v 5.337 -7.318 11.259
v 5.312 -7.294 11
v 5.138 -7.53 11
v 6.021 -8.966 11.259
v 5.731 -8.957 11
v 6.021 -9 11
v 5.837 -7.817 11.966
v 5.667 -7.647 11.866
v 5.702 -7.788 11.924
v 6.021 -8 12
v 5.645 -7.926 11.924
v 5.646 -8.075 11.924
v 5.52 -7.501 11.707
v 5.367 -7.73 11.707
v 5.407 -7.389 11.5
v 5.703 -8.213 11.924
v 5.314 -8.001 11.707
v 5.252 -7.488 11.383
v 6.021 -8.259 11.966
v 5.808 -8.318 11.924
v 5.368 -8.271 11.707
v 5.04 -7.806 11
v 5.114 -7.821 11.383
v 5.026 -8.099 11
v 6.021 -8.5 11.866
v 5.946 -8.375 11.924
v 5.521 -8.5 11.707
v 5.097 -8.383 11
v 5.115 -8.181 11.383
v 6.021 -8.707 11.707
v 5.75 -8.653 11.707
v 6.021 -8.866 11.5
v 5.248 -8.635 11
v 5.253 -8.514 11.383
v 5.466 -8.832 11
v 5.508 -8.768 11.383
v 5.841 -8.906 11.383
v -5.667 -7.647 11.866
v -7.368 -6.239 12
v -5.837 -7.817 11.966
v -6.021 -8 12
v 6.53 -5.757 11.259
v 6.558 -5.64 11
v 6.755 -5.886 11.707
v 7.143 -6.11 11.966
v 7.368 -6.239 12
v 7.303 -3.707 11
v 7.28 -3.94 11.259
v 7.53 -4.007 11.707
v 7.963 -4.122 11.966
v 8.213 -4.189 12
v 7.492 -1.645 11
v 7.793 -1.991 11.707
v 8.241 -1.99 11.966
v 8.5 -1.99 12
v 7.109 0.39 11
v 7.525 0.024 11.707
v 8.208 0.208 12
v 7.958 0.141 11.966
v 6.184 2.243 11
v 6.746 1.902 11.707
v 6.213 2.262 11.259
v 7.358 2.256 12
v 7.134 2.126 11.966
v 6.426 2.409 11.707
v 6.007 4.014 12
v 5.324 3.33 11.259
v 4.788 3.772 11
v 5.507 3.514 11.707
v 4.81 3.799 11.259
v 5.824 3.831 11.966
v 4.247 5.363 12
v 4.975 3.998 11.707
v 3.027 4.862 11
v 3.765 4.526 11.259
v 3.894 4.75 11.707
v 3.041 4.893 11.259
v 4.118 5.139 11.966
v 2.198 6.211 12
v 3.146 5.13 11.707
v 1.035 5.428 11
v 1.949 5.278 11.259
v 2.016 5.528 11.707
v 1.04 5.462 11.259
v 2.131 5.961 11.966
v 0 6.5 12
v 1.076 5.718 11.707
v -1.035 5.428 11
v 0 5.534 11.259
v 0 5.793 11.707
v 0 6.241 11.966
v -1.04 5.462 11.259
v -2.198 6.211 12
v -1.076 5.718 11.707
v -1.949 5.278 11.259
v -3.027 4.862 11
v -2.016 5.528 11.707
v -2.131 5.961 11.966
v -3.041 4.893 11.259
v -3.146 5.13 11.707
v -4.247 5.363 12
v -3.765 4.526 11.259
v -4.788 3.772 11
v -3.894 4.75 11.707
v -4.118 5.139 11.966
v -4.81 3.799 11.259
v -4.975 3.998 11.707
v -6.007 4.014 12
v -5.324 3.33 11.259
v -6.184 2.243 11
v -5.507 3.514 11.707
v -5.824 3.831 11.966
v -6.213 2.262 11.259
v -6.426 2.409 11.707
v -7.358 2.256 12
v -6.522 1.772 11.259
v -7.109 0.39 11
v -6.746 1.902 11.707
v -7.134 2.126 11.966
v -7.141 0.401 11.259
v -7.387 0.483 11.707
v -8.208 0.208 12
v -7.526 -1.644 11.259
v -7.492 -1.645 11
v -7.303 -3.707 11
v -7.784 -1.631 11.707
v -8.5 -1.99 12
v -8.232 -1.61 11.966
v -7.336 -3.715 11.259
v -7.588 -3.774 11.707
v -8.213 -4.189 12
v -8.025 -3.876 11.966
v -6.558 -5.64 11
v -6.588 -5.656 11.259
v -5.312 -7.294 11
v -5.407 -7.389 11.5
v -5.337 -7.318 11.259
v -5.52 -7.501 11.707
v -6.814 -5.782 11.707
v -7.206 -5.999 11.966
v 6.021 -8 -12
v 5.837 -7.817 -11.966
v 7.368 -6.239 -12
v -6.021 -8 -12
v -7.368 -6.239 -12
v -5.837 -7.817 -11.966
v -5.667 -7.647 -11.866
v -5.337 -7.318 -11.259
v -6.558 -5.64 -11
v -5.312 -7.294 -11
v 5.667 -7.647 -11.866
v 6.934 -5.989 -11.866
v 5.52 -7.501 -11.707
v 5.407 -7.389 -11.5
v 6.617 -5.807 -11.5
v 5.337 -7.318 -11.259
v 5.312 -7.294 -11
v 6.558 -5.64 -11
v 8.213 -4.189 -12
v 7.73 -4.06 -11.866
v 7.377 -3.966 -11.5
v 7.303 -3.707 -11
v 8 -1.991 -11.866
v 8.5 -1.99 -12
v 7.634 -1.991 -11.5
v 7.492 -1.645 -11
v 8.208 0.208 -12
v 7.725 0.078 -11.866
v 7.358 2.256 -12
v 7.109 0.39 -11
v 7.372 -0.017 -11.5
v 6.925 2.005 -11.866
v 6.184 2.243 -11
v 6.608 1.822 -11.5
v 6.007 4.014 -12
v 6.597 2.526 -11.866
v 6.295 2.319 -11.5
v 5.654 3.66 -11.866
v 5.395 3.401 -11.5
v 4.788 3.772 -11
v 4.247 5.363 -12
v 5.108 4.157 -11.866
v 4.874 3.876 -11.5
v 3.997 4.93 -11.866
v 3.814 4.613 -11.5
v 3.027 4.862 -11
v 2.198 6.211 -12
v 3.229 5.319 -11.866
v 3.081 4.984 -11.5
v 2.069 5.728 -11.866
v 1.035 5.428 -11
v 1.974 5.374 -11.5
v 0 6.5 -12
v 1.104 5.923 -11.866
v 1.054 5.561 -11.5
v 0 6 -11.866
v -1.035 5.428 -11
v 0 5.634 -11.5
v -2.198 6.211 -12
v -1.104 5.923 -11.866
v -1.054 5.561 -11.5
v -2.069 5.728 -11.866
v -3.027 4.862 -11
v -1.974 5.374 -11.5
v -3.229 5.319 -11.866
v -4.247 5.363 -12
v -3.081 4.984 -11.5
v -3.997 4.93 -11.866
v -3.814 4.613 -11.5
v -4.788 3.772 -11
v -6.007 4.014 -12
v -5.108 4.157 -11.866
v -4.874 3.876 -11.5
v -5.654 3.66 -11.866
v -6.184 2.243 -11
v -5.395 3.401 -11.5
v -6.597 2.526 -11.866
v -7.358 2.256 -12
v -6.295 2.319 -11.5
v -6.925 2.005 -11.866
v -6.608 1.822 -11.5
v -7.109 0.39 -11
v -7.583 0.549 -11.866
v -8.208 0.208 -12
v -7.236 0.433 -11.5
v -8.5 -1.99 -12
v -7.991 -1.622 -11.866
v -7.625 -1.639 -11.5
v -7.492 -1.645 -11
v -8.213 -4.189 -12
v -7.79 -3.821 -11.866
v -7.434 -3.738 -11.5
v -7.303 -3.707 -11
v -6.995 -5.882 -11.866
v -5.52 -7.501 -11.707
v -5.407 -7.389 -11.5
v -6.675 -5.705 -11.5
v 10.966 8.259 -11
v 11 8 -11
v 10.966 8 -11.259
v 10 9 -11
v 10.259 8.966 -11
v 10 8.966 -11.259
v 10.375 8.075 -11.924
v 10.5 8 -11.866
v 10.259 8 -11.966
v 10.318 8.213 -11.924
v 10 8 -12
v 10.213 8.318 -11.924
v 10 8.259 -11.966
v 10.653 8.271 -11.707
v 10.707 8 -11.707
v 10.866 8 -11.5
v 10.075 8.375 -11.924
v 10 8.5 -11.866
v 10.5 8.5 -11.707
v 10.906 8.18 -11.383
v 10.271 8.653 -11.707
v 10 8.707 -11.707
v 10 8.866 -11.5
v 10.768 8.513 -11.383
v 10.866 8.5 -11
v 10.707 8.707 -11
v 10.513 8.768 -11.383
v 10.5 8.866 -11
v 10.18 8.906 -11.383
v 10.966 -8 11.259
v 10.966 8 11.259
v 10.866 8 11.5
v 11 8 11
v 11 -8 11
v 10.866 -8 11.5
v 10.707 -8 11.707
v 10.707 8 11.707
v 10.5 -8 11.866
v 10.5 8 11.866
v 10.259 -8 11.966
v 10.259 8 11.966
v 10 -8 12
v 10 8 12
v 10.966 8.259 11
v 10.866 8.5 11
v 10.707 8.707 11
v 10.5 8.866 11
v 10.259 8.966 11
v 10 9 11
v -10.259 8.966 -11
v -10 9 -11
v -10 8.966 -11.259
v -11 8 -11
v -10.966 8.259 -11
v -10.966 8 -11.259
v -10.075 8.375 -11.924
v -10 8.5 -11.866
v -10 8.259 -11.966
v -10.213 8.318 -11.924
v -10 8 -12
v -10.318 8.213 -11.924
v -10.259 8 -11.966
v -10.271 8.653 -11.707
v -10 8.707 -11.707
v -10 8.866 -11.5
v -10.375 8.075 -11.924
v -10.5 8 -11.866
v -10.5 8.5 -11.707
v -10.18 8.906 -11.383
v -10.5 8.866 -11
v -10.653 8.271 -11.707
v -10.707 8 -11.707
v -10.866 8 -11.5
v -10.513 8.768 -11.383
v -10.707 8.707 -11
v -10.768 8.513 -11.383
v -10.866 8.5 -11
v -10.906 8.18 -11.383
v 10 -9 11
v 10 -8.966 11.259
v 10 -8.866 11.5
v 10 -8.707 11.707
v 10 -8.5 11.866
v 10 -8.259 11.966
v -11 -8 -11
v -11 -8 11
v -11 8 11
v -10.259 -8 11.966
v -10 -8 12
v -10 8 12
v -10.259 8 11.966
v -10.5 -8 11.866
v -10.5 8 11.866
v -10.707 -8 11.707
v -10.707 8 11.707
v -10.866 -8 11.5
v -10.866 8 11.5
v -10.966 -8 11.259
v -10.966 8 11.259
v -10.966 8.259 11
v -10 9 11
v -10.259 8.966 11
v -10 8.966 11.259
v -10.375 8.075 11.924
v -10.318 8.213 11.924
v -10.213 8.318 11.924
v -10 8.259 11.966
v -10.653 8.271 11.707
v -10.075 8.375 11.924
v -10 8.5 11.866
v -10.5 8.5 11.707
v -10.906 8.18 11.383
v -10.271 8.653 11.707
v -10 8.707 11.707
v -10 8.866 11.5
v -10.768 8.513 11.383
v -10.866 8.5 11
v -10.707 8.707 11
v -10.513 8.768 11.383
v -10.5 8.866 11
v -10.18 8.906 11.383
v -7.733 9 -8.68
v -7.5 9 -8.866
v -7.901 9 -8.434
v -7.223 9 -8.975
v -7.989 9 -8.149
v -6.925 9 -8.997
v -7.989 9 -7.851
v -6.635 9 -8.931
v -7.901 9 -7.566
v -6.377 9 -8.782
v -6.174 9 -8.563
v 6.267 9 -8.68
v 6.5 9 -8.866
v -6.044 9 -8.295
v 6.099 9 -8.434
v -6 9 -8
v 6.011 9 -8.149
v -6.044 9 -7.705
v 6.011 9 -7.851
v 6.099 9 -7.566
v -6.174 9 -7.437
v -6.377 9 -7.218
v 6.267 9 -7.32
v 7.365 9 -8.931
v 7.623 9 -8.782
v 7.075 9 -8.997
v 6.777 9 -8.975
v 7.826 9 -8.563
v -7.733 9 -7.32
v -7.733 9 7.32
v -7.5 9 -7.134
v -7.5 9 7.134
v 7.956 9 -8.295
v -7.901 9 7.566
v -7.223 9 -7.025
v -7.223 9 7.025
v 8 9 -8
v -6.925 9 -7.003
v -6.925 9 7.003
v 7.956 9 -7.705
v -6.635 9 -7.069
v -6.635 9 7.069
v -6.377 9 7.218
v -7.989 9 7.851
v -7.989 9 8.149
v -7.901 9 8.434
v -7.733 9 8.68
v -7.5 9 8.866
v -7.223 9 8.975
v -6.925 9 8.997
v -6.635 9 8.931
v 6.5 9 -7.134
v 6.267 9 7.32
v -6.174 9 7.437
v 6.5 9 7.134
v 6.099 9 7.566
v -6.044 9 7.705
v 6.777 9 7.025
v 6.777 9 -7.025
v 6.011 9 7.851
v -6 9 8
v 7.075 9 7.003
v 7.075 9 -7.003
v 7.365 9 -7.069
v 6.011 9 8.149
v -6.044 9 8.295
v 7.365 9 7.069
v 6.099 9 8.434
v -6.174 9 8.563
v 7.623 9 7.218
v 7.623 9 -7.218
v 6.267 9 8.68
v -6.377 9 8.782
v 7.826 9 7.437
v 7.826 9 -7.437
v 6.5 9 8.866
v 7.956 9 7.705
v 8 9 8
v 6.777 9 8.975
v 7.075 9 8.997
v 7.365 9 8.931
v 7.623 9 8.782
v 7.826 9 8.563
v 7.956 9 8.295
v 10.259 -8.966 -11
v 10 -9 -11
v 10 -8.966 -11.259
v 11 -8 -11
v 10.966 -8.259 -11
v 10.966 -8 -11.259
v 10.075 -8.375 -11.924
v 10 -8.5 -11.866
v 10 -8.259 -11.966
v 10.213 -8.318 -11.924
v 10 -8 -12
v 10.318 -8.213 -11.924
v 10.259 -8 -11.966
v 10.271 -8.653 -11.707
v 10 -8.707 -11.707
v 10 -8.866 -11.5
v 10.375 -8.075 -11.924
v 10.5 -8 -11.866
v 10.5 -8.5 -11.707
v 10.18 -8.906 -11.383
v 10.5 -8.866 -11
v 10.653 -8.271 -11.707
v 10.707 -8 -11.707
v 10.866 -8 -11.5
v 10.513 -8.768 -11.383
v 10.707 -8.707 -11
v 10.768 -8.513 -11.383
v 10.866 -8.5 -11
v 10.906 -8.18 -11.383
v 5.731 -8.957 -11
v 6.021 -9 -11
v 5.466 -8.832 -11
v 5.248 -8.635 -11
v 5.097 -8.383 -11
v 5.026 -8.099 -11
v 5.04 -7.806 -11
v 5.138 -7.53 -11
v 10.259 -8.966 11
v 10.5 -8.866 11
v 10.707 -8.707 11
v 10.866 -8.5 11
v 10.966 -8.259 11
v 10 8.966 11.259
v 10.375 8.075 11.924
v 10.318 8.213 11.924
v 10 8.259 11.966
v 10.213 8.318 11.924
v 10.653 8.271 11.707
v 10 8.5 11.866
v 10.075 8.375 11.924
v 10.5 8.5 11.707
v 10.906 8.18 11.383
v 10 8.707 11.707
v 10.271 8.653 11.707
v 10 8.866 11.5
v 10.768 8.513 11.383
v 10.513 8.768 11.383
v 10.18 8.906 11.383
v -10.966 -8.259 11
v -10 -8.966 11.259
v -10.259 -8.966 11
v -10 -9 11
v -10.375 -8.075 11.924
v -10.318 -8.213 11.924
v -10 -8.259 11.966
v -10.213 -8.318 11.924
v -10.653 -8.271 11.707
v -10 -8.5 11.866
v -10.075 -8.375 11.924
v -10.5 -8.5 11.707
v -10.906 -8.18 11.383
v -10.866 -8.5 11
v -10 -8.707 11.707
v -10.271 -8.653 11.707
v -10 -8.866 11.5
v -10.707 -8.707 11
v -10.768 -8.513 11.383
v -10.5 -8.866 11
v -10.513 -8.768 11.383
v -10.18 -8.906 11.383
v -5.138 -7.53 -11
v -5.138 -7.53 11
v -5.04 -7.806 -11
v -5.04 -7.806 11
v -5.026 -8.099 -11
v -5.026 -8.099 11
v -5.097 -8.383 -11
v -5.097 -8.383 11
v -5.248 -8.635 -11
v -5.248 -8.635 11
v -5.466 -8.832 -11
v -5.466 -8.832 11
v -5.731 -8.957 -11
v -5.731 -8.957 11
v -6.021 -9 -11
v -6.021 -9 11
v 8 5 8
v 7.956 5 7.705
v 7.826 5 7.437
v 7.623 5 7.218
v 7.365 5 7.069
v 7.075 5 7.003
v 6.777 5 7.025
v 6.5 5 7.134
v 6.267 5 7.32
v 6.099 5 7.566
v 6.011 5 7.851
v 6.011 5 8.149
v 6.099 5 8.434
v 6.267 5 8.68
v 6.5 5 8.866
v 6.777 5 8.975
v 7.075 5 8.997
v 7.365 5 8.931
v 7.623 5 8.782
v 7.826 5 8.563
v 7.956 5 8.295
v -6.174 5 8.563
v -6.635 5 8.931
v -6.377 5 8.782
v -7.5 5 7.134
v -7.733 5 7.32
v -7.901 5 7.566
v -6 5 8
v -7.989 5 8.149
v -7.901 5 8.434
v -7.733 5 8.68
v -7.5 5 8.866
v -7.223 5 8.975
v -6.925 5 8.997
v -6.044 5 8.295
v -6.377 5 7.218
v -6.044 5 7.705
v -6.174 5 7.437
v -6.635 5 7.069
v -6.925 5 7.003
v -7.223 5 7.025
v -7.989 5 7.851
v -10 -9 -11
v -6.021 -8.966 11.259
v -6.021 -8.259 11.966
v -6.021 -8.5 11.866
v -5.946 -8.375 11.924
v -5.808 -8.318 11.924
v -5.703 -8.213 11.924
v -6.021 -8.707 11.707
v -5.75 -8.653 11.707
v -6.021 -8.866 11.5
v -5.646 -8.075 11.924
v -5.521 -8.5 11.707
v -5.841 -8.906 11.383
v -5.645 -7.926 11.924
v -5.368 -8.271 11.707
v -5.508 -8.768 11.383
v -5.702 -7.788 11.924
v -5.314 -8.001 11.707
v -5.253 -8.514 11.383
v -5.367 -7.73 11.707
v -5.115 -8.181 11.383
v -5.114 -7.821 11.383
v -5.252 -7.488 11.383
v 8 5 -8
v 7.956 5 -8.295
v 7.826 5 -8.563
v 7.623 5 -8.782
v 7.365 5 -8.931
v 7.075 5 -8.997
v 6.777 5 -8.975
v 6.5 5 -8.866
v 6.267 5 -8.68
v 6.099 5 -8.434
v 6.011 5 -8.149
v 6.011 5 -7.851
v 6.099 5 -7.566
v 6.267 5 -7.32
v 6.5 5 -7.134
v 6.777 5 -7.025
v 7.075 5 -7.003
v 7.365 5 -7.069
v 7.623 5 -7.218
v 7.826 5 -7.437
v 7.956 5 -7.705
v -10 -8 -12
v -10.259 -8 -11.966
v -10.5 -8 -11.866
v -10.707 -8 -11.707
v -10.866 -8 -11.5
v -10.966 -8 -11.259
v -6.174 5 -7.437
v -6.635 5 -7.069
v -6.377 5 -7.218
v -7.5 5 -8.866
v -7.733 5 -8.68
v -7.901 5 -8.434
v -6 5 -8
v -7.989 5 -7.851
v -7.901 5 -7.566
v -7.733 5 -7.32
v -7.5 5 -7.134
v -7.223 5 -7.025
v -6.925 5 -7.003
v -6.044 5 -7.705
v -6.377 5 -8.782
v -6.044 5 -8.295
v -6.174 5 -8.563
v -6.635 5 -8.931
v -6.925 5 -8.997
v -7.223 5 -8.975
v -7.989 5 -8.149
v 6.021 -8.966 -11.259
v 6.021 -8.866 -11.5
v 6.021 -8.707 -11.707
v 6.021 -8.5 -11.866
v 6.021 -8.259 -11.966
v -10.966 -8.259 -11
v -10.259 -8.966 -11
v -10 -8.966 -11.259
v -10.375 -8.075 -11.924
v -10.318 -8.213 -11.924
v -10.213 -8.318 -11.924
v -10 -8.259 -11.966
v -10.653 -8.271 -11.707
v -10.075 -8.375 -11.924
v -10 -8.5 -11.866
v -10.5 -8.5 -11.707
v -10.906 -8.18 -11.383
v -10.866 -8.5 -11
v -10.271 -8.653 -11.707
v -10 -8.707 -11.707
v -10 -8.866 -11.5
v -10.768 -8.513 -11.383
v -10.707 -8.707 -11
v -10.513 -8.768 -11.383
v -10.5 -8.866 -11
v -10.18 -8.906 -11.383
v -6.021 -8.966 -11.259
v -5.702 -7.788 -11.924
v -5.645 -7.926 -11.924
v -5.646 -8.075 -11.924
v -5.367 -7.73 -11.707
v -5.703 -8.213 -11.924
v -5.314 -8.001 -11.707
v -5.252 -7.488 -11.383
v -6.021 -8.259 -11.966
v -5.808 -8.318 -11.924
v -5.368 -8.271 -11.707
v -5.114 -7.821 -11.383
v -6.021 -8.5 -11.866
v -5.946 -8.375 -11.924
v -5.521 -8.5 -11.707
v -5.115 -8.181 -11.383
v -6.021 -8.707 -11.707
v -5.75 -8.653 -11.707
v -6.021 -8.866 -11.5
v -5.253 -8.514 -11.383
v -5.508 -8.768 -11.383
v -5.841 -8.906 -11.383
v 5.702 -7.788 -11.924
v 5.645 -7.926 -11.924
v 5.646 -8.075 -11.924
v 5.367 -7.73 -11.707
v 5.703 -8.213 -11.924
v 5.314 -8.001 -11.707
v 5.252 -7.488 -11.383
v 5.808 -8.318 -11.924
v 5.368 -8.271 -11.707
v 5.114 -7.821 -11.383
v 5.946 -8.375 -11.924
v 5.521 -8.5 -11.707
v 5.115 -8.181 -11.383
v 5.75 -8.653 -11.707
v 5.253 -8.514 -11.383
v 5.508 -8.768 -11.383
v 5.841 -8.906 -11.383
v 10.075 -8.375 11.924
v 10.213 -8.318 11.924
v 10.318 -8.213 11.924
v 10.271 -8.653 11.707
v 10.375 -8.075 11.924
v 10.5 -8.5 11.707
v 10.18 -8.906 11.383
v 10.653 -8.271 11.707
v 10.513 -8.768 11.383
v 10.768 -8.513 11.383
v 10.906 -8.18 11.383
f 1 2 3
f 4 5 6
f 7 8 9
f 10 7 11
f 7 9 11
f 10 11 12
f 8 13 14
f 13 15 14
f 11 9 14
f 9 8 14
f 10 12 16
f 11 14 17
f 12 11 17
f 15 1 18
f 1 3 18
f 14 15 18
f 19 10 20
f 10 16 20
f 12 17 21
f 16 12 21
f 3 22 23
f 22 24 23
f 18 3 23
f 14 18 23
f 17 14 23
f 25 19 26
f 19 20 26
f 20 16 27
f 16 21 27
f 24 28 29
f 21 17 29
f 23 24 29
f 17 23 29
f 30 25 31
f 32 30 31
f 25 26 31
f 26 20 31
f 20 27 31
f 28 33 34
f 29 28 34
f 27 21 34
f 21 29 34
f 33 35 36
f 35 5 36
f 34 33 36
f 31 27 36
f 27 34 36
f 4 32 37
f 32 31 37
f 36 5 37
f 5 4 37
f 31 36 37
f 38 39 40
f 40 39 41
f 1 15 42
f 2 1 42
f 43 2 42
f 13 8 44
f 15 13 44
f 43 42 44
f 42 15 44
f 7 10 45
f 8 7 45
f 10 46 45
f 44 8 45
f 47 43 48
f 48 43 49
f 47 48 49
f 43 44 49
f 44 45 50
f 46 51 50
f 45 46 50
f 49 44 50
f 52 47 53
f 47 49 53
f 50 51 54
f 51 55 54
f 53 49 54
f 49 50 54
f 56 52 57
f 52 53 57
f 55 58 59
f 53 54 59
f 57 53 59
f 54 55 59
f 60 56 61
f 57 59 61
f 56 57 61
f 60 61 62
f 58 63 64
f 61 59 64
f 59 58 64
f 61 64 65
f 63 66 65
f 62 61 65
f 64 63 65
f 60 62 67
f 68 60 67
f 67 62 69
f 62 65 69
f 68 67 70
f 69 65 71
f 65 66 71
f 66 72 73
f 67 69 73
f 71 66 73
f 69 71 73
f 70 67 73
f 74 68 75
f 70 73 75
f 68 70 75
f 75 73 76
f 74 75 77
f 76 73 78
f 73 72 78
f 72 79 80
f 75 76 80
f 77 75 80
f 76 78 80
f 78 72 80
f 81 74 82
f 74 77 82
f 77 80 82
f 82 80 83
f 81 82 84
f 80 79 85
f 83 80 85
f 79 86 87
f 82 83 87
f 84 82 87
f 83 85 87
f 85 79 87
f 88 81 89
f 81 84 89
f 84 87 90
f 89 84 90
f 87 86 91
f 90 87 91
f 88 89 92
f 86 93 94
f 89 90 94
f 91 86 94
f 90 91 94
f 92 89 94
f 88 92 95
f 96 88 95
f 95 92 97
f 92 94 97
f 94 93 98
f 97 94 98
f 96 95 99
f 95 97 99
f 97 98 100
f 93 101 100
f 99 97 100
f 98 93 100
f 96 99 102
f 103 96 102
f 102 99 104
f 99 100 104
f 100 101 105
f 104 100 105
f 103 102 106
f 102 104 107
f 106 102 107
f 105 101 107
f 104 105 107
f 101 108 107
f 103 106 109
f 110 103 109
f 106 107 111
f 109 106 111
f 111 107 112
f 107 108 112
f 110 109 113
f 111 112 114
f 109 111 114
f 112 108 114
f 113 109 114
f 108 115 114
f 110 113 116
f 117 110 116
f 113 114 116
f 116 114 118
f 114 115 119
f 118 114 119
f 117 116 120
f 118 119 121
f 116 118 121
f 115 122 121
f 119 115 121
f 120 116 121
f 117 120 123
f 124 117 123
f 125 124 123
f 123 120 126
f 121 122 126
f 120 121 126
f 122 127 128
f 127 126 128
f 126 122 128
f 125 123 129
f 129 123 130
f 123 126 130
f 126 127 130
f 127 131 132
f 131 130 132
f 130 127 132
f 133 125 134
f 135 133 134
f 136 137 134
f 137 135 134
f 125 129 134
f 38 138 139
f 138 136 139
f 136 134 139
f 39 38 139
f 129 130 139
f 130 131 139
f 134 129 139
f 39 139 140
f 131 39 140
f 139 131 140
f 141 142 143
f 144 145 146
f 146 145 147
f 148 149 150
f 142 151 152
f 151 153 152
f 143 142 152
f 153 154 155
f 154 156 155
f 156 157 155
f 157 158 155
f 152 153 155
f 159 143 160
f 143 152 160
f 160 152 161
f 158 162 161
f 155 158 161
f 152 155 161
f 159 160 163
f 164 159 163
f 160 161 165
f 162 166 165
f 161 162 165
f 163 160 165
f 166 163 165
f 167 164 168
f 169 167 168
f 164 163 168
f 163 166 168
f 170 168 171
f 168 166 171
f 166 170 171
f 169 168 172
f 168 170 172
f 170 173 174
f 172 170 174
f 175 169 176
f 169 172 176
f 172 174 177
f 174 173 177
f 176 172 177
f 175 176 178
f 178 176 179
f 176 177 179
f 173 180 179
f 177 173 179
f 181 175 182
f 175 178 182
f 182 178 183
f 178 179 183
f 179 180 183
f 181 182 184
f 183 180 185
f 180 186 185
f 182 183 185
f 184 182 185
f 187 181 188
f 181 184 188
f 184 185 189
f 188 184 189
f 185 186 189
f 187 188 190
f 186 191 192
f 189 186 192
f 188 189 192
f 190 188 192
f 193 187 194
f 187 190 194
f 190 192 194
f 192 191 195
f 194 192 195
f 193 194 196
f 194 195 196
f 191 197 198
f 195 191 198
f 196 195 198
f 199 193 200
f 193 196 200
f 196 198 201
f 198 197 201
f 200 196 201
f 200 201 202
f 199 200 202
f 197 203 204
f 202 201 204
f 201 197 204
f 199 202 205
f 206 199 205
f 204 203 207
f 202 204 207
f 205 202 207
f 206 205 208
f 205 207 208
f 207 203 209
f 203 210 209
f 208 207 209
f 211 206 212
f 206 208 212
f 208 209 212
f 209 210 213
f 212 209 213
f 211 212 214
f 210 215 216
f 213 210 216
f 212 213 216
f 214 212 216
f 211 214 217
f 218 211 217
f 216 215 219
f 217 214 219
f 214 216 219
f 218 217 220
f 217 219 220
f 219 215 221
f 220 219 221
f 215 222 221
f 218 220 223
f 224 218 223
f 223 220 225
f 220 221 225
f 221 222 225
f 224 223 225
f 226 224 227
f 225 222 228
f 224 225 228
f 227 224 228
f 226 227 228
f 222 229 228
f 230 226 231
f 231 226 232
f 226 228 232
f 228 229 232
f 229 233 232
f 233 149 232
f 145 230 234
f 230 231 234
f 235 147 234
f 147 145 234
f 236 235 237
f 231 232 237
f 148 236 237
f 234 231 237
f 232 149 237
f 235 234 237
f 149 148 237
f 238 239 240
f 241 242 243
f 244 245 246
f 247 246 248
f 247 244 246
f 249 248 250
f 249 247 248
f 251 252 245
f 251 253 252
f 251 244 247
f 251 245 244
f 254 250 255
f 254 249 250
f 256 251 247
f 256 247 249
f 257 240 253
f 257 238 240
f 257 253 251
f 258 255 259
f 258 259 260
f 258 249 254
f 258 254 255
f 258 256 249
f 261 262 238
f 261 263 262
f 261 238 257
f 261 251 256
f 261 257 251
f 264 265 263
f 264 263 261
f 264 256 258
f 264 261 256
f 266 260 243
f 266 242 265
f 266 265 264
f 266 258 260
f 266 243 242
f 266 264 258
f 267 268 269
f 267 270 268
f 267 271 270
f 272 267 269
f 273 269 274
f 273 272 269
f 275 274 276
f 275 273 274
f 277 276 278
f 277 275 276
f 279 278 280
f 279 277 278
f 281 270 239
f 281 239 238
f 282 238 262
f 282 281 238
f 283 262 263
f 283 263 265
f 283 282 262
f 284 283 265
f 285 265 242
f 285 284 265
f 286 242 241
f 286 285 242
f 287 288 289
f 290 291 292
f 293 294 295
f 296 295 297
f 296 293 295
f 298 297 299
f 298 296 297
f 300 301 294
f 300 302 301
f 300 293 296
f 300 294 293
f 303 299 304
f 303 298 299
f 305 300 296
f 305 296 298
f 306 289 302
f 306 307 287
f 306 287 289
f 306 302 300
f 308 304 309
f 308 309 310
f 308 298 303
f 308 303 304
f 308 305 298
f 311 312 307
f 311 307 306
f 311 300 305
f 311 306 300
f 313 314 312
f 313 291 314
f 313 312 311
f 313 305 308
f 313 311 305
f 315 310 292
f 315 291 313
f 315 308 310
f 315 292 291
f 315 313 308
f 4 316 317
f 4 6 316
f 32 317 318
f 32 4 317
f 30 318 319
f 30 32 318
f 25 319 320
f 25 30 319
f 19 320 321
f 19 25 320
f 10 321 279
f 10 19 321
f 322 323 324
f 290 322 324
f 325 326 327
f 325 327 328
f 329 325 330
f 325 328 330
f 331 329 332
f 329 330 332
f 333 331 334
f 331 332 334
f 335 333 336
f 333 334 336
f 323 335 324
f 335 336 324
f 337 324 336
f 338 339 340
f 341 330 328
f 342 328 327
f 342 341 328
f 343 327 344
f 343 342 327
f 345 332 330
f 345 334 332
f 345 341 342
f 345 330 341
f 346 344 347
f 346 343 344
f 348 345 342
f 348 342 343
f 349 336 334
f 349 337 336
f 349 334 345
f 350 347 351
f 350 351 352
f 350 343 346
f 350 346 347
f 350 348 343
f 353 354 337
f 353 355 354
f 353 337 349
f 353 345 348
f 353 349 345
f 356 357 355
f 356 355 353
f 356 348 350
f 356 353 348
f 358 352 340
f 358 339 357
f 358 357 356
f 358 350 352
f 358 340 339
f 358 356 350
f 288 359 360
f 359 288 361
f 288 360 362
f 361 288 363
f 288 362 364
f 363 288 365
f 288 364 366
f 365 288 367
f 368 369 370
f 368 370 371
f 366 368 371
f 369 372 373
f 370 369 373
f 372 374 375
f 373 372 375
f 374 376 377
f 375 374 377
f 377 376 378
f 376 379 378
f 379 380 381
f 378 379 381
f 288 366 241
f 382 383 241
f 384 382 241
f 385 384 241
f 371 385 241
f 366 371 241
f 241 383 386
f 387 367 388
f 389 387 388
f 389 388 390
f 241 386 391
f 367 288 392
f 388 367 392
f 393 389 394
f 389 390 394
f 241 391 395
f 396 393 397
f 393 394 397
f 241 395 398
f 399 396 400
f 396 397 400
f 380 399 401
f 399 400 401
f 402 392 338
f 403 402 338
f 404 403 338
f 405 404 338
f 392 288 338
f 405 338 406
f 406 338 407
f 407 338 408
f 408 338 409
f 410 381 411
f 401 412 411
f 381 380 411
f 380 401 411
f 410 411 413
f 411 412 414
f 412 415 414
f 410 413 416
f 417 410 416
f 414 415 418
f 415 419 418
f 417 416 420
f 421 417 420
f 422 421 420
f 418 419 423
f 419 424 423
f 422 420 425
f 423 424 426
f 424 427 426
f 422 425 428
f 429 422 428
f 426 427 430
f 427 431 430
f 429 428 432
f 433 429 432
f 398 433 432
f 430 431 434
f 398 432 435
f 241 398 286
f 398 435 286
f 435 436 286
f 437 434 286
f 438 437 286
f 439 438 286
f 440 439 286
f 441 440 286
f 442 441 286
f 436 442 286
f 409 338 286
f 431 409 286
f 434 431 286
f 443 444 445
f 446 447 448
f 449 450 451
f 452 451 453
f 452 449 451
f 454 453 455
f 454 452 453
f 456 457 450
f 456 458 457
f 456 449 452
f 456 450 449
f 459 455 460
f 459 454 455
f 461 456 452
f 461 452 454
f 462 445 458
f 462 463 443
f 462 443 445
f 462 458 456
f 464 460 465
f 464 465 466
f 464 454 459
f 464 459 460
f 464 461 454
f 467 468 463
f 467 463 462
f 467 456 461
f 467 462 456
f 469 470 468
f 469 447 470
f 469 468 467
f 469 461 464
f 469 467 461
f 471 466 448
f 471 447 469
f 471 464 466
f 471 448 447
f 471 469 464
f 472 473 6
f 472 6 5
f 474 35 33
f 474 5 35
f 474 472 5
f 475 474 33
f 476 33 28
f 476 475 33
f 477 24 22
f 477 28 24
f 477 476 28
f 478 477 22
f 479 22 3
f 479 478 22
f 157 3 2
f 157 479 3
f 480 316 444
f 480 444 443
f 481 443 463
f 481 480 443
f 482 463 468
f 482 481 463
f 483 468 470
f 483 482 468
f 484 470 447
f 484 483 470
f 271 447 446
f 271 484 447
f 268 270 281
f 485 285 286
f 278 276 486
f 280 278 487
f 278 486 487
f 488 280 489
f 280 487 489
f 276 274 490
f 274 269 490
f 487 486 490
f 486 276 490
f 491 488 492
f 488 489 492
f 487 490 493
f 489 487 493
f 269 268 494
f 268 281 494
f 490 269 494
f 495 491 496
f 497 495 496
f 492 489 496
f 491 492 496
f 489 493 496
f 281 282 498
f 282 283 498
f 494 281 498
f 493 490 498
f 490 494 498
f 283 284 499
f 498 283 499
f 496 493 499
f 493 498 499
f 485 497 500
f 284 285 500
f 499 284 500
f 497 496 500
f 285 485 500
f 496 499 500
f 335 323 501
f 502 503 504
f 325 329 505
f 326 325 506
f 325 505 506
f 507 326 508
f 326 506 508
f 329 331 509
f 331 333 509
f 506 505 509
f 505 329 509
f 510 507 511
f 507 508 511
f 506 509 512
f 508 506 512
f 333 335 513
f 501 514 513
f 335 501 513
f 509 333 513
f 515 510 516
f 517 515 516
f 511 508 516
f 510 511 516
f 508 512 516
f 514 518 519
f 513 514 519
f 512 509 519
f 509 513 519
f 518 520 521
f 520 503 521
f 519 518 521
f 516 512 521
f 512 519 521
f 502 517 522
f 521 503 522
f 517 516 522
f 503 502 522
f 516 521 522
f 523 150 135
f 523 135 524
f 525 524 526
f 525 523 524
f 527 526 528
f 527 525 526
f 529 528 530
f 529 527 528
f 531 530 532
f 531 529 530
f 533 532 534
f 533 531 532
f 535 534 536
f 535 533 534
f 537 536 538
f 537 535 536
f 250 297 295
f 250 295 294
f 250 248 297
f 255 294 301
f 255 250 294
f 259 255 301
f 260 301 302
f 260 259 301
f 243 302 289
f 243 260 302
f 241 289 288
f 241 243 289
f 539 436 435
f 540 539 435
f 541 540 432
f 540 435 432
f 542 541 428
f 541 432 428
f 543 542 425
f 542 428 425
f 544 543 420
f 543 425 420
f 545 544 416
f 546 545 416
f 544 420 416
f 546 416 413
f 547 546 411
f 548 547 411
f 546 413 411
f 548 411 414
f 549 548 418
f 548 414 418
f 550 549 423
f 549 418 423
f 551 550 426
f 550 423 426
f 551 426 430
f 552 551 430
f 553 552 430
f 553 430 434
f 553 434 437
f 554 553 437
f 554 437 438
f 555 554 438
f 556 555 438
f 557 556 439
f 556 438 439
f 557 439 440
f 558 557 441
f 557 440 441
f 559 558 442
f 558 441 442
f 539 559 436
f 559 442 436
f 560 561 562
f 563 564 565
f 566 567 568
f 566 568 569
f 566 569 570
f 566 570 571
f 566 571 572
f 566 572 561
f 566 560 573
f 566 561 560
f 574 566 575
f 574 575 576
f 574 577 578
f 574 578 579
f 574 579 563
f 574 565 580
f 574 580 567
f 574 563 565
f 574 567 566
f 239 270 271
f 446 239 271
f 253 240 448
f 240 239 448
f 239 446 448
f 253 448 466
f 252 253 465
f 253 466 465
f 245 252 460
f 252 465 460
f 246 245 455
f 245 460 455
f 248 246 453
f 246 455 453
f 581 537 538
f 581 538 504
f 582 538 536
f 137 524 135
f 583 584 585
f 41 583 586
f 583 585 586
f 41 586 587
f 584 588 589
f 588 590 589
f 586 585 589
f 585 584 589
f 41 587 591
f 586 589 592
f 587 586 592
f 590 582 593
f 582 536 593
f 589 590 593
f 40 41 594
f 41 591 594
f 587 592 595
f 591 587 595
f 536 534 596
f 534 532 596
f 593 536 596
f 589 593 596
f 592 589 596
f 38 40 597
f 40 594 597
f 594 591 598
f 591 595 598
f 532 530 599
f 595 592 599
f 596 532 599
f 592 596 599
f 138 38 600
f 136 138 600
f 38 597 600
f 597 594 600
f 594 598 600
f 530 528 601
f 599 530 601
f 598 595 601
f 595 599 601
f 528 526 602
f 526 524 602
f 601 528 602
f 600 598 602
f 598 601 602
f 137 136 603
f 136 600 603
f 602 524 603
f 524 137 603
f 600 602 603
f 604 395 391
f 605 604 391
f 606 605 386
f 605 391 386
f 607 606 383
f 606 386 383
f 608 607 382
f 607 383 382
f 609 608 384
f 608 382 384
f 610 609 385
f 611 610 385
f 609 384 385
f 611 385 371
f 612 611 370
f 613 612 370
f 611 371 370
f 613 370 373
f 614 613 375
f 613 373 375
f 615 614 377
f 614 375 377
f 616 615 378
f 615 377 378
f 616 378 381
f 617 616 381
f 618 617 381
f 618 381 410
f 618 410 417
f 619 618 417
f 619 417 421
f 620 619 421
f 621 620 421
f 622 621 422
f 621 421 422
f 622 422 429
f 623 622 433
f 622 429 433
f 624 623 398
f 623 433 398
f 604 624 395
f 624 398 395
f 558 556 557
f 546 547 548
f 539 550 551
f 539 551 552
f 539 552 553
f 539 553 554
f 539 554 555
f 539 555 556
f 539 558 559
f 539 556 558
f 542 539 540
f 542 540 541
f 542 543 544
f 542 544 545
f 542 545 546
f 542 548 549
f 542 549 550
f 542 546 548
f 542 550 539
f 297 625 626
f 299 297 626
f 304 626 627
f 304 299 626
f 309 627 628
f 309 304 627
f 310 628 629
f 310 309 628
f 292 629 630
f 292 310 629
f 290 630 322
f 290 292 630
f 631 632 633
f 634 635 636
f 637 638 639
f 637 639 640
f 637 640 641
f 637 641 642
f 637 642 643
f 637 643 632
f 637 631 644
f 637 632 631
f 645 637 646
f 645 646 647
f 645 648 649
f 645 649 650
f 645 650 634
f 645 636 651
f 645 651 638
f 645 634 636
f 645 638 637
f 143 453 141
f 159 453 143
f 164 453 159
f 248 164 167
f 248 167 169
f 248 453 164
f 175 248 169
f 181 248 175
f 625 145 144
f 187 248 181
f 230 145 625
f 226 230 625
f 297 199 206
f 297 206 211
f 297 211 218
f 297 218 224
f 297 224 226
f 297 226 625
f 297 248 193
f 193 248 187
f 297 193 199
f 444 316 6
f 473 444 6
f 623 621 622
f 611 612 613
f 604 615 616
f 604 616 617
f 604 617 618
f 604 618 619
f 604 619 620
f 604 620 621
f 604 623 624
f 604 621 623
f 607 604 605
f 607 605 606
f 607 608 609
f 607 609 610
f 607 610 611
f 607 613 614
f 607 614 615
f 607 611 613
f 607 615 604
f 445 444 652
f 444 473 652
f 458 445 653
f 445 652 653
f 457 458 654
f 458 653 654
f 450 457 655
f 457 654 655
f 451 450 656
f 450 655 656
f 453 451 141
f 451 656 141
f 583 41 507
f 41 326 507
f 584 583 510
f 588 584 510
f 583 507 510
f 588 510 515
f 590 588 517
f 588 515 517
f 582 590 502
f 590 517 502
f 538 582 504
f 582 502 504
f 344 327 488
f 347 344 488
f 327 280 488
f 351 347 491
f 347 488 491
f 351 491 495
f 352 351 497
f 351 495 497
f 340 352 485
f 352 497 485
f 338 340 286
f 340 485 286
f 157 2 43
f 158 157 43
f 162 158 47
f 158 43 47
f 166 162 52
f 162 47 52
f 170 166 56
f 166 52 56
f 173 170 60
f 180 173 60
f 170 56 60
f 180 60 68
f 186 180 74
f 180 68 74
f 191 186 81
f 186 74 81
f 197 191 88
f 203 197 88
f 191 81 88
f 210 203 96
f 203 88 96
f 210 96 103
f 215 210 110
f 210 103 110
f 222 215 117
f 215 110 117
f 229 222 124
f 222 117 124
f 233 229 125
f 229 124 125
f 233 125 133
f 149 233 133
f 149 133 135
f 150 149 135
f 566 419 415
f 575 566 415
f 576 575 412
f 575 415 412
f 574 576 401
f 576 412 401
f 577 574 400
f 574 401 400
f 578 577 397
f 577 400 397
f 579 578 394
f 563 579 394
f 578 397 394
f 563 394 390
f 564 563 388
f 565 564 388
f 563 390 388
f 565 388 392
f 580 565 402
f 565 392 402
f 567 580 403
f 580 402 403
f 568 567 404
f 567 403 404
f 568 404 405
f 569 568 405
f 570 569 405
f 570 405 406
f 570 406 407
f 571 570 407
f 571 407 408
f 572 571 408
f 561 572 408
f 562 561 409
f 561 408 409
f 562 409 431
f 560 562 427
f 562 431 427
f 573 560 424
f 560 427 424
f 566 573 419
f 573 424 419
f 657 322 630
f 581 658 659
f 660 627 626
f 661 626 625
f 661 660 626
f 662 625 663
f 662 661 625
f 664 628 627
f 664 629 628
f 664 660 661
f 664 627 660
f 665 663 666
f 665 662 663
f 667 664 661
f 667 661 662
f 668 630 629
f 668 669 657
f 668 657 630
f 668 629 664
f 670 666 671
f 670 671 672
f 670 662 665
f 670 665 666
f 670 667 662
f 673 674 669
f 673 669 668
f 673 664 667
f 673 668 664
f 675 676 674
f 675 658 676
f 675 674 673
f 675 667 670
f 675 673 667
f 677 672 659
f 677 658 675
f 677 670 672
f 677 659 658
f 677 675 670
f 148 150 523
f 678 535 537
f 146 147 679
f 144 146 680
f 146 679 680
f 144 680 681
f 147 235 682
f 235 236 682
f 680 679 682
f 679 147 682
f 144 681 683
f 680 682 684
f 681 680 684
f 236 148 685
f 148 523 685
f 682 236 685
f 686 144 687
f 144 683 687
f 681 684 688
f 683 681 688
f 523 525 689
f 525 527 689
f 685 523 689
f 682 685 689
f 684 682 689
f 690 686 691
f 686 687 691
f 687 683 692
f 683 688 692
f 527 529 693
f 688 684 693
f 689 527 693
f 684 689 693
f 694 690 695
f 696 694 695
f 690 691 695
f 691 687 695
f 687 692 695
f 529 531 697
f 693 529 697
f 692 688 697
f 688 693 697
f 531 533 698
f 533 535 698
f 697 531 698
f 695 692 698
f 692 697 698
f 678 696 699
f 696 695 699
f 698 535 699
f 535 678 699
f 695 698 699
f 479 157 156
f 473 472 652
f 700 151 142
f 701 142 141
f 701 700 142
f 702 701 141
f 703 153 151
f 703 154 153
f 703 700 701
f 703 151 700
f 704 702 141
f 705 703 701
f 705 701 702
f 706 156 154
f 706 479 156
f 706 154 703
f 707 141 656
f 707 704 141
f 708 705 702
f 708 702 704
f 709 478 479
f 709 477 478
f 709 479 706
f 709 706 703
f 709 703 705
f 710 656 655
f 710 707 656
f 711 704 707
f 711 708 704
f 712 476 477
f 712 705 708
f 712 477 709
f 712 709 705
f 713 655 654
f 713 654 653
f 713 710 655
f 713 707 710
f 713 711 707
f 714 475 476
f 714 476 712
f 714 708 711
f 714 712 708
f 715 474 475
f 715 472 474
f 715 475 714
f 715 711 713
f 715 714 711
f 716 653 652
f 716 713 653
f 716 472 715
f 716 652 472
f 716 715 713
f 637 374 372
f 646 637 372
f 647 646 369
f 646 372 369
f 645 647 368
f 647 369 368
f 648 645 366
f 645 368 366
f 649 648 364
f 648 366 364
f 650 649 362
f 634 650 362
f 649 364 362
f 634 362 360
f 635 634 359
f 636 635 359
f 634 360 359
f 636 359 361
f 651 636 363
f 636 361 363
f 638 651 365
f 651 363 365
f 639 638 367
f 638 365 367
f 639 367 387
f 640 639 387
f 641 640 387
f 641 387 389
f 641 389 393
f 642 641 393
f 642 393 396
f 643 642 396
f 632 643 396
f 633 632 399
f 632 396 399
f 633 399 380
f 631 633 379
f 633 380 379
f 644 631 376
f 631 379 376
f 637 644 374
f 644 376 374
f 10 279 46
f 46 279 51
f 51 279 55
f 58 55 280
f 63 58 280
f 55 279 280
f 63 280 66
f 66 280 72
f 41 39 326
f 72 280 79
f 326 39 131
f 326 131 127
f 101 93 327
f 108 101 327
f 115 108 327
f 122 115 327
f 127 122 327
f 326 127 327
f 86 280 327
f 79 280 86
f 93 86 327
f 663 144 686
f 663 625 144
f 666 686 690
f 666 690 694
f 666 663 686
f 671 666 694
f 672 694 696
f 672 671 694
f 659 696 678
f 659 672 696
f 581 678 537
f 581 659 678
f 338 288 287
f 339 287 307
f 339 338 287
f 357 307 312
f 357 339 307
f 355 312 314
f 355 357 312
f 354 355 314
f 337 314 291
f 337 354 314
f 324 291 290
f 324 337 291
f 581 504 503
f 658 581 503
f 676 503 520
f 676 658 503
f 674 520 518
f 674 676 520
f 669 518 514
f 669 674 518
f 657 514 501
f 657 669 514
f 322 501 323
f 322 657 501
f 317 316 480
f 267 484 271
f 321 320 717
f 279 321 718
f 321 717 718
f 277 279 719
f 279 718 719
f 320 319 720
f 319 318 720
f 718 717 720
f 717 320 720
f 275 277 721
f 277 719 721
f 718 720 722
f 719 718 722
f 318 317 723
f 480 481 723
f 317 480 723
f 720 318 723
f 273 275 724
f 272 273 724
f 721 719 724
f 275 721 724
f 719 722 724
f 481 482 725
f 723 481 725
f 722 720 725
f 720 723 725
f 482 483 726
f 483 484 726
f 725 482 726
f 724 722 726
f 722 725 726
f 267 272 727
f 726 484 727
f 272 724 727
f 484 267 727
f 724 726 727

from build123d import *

# Parameters (mm, degrees)
BOSS_EXTRU_1_DEPTH      = 12
BOSS_EXTRU_1_DEPTH_BACK = 12
ENL_V_START             = 9
ESQUISSE2_R             = 1
ENL_V_MAT_EXTRU_1_DEPTH = 4
CONG_1_R                = 1


with BuildPart() as part:
    # Esquisse1 → Boss.-Extru.1 (new body, two sides)
    with BuildSketch(Plane.XY) as boss_extru_1_sk:
        with BuildLine():
            Line((11, -9), (2.692582404, -9))
            ThreePointArc((2.692582404, -9), (0, 5.5), (-2.692582404, -9))
            Line((-2.692582404, -9), (-11, -9))
            Line((-11, -9), (-11, 9))
            Line((-11, 9), (11, 9))
            Line((11, 9), (11, -9))
        make_face()
    extrude(amount=BOSS_EXTRU_1_DEPTH)
    extrude(boss_extru_1_sk.sketch, amount=-BOSS_EXTRU_1_DEPTH_BACK)

    # Esquisse2 → Enlèv. mat.-Extru.1 (cut)
    with BuildSketch(Plane(origin=(0, 0, 0), x_dir=(1, 0, 0), z_dir=(0, 1, 0)).offset(ENL_V_START)):
        with Locations((-7, 8)):
            Circle(ESQUISSE2_R)
        with Locations((7, 8)):
            Circle(ESQUISSE2_R)
        with Locations((7, -8)):
            Circle(ESQUISSE2_R)
        with Locations((-7, -8)):
            Circle(ESQUISSE2_R)
    extrude(amount=-ENL_V_MAT_EXTRU_1_DEPTH, mode=Mode.SUBTRACT)

    # Congé1
    cong_1_edges = [part.edges().sort_by_distance(p)[0] for p in [
        (-11, 9, 0),
        (11, 9, 0),
        (11, -9, 0),
        (2.692582404, -9, 0),
        (-2.692582404, -9, 0),
        (-11, -9, 0),
        (0, 5.5, -12),
        (6.846291202, -9, -12),
        (-11, 0, 12),
        (-6.846291202, -9, 12),
        (0, 5.5, 12),
        (6.846291202, -9, 12),
        (11, 0, 12),
        (0, 9, 12),
        (11, 0, -12),
        (0, 9, -12),
        (-11, 0, -12),
        (-6.846291202, -9, -12),
    ]]
    fillet(cong_1_edges, radius=CONG_1_R)


solid = part.part
